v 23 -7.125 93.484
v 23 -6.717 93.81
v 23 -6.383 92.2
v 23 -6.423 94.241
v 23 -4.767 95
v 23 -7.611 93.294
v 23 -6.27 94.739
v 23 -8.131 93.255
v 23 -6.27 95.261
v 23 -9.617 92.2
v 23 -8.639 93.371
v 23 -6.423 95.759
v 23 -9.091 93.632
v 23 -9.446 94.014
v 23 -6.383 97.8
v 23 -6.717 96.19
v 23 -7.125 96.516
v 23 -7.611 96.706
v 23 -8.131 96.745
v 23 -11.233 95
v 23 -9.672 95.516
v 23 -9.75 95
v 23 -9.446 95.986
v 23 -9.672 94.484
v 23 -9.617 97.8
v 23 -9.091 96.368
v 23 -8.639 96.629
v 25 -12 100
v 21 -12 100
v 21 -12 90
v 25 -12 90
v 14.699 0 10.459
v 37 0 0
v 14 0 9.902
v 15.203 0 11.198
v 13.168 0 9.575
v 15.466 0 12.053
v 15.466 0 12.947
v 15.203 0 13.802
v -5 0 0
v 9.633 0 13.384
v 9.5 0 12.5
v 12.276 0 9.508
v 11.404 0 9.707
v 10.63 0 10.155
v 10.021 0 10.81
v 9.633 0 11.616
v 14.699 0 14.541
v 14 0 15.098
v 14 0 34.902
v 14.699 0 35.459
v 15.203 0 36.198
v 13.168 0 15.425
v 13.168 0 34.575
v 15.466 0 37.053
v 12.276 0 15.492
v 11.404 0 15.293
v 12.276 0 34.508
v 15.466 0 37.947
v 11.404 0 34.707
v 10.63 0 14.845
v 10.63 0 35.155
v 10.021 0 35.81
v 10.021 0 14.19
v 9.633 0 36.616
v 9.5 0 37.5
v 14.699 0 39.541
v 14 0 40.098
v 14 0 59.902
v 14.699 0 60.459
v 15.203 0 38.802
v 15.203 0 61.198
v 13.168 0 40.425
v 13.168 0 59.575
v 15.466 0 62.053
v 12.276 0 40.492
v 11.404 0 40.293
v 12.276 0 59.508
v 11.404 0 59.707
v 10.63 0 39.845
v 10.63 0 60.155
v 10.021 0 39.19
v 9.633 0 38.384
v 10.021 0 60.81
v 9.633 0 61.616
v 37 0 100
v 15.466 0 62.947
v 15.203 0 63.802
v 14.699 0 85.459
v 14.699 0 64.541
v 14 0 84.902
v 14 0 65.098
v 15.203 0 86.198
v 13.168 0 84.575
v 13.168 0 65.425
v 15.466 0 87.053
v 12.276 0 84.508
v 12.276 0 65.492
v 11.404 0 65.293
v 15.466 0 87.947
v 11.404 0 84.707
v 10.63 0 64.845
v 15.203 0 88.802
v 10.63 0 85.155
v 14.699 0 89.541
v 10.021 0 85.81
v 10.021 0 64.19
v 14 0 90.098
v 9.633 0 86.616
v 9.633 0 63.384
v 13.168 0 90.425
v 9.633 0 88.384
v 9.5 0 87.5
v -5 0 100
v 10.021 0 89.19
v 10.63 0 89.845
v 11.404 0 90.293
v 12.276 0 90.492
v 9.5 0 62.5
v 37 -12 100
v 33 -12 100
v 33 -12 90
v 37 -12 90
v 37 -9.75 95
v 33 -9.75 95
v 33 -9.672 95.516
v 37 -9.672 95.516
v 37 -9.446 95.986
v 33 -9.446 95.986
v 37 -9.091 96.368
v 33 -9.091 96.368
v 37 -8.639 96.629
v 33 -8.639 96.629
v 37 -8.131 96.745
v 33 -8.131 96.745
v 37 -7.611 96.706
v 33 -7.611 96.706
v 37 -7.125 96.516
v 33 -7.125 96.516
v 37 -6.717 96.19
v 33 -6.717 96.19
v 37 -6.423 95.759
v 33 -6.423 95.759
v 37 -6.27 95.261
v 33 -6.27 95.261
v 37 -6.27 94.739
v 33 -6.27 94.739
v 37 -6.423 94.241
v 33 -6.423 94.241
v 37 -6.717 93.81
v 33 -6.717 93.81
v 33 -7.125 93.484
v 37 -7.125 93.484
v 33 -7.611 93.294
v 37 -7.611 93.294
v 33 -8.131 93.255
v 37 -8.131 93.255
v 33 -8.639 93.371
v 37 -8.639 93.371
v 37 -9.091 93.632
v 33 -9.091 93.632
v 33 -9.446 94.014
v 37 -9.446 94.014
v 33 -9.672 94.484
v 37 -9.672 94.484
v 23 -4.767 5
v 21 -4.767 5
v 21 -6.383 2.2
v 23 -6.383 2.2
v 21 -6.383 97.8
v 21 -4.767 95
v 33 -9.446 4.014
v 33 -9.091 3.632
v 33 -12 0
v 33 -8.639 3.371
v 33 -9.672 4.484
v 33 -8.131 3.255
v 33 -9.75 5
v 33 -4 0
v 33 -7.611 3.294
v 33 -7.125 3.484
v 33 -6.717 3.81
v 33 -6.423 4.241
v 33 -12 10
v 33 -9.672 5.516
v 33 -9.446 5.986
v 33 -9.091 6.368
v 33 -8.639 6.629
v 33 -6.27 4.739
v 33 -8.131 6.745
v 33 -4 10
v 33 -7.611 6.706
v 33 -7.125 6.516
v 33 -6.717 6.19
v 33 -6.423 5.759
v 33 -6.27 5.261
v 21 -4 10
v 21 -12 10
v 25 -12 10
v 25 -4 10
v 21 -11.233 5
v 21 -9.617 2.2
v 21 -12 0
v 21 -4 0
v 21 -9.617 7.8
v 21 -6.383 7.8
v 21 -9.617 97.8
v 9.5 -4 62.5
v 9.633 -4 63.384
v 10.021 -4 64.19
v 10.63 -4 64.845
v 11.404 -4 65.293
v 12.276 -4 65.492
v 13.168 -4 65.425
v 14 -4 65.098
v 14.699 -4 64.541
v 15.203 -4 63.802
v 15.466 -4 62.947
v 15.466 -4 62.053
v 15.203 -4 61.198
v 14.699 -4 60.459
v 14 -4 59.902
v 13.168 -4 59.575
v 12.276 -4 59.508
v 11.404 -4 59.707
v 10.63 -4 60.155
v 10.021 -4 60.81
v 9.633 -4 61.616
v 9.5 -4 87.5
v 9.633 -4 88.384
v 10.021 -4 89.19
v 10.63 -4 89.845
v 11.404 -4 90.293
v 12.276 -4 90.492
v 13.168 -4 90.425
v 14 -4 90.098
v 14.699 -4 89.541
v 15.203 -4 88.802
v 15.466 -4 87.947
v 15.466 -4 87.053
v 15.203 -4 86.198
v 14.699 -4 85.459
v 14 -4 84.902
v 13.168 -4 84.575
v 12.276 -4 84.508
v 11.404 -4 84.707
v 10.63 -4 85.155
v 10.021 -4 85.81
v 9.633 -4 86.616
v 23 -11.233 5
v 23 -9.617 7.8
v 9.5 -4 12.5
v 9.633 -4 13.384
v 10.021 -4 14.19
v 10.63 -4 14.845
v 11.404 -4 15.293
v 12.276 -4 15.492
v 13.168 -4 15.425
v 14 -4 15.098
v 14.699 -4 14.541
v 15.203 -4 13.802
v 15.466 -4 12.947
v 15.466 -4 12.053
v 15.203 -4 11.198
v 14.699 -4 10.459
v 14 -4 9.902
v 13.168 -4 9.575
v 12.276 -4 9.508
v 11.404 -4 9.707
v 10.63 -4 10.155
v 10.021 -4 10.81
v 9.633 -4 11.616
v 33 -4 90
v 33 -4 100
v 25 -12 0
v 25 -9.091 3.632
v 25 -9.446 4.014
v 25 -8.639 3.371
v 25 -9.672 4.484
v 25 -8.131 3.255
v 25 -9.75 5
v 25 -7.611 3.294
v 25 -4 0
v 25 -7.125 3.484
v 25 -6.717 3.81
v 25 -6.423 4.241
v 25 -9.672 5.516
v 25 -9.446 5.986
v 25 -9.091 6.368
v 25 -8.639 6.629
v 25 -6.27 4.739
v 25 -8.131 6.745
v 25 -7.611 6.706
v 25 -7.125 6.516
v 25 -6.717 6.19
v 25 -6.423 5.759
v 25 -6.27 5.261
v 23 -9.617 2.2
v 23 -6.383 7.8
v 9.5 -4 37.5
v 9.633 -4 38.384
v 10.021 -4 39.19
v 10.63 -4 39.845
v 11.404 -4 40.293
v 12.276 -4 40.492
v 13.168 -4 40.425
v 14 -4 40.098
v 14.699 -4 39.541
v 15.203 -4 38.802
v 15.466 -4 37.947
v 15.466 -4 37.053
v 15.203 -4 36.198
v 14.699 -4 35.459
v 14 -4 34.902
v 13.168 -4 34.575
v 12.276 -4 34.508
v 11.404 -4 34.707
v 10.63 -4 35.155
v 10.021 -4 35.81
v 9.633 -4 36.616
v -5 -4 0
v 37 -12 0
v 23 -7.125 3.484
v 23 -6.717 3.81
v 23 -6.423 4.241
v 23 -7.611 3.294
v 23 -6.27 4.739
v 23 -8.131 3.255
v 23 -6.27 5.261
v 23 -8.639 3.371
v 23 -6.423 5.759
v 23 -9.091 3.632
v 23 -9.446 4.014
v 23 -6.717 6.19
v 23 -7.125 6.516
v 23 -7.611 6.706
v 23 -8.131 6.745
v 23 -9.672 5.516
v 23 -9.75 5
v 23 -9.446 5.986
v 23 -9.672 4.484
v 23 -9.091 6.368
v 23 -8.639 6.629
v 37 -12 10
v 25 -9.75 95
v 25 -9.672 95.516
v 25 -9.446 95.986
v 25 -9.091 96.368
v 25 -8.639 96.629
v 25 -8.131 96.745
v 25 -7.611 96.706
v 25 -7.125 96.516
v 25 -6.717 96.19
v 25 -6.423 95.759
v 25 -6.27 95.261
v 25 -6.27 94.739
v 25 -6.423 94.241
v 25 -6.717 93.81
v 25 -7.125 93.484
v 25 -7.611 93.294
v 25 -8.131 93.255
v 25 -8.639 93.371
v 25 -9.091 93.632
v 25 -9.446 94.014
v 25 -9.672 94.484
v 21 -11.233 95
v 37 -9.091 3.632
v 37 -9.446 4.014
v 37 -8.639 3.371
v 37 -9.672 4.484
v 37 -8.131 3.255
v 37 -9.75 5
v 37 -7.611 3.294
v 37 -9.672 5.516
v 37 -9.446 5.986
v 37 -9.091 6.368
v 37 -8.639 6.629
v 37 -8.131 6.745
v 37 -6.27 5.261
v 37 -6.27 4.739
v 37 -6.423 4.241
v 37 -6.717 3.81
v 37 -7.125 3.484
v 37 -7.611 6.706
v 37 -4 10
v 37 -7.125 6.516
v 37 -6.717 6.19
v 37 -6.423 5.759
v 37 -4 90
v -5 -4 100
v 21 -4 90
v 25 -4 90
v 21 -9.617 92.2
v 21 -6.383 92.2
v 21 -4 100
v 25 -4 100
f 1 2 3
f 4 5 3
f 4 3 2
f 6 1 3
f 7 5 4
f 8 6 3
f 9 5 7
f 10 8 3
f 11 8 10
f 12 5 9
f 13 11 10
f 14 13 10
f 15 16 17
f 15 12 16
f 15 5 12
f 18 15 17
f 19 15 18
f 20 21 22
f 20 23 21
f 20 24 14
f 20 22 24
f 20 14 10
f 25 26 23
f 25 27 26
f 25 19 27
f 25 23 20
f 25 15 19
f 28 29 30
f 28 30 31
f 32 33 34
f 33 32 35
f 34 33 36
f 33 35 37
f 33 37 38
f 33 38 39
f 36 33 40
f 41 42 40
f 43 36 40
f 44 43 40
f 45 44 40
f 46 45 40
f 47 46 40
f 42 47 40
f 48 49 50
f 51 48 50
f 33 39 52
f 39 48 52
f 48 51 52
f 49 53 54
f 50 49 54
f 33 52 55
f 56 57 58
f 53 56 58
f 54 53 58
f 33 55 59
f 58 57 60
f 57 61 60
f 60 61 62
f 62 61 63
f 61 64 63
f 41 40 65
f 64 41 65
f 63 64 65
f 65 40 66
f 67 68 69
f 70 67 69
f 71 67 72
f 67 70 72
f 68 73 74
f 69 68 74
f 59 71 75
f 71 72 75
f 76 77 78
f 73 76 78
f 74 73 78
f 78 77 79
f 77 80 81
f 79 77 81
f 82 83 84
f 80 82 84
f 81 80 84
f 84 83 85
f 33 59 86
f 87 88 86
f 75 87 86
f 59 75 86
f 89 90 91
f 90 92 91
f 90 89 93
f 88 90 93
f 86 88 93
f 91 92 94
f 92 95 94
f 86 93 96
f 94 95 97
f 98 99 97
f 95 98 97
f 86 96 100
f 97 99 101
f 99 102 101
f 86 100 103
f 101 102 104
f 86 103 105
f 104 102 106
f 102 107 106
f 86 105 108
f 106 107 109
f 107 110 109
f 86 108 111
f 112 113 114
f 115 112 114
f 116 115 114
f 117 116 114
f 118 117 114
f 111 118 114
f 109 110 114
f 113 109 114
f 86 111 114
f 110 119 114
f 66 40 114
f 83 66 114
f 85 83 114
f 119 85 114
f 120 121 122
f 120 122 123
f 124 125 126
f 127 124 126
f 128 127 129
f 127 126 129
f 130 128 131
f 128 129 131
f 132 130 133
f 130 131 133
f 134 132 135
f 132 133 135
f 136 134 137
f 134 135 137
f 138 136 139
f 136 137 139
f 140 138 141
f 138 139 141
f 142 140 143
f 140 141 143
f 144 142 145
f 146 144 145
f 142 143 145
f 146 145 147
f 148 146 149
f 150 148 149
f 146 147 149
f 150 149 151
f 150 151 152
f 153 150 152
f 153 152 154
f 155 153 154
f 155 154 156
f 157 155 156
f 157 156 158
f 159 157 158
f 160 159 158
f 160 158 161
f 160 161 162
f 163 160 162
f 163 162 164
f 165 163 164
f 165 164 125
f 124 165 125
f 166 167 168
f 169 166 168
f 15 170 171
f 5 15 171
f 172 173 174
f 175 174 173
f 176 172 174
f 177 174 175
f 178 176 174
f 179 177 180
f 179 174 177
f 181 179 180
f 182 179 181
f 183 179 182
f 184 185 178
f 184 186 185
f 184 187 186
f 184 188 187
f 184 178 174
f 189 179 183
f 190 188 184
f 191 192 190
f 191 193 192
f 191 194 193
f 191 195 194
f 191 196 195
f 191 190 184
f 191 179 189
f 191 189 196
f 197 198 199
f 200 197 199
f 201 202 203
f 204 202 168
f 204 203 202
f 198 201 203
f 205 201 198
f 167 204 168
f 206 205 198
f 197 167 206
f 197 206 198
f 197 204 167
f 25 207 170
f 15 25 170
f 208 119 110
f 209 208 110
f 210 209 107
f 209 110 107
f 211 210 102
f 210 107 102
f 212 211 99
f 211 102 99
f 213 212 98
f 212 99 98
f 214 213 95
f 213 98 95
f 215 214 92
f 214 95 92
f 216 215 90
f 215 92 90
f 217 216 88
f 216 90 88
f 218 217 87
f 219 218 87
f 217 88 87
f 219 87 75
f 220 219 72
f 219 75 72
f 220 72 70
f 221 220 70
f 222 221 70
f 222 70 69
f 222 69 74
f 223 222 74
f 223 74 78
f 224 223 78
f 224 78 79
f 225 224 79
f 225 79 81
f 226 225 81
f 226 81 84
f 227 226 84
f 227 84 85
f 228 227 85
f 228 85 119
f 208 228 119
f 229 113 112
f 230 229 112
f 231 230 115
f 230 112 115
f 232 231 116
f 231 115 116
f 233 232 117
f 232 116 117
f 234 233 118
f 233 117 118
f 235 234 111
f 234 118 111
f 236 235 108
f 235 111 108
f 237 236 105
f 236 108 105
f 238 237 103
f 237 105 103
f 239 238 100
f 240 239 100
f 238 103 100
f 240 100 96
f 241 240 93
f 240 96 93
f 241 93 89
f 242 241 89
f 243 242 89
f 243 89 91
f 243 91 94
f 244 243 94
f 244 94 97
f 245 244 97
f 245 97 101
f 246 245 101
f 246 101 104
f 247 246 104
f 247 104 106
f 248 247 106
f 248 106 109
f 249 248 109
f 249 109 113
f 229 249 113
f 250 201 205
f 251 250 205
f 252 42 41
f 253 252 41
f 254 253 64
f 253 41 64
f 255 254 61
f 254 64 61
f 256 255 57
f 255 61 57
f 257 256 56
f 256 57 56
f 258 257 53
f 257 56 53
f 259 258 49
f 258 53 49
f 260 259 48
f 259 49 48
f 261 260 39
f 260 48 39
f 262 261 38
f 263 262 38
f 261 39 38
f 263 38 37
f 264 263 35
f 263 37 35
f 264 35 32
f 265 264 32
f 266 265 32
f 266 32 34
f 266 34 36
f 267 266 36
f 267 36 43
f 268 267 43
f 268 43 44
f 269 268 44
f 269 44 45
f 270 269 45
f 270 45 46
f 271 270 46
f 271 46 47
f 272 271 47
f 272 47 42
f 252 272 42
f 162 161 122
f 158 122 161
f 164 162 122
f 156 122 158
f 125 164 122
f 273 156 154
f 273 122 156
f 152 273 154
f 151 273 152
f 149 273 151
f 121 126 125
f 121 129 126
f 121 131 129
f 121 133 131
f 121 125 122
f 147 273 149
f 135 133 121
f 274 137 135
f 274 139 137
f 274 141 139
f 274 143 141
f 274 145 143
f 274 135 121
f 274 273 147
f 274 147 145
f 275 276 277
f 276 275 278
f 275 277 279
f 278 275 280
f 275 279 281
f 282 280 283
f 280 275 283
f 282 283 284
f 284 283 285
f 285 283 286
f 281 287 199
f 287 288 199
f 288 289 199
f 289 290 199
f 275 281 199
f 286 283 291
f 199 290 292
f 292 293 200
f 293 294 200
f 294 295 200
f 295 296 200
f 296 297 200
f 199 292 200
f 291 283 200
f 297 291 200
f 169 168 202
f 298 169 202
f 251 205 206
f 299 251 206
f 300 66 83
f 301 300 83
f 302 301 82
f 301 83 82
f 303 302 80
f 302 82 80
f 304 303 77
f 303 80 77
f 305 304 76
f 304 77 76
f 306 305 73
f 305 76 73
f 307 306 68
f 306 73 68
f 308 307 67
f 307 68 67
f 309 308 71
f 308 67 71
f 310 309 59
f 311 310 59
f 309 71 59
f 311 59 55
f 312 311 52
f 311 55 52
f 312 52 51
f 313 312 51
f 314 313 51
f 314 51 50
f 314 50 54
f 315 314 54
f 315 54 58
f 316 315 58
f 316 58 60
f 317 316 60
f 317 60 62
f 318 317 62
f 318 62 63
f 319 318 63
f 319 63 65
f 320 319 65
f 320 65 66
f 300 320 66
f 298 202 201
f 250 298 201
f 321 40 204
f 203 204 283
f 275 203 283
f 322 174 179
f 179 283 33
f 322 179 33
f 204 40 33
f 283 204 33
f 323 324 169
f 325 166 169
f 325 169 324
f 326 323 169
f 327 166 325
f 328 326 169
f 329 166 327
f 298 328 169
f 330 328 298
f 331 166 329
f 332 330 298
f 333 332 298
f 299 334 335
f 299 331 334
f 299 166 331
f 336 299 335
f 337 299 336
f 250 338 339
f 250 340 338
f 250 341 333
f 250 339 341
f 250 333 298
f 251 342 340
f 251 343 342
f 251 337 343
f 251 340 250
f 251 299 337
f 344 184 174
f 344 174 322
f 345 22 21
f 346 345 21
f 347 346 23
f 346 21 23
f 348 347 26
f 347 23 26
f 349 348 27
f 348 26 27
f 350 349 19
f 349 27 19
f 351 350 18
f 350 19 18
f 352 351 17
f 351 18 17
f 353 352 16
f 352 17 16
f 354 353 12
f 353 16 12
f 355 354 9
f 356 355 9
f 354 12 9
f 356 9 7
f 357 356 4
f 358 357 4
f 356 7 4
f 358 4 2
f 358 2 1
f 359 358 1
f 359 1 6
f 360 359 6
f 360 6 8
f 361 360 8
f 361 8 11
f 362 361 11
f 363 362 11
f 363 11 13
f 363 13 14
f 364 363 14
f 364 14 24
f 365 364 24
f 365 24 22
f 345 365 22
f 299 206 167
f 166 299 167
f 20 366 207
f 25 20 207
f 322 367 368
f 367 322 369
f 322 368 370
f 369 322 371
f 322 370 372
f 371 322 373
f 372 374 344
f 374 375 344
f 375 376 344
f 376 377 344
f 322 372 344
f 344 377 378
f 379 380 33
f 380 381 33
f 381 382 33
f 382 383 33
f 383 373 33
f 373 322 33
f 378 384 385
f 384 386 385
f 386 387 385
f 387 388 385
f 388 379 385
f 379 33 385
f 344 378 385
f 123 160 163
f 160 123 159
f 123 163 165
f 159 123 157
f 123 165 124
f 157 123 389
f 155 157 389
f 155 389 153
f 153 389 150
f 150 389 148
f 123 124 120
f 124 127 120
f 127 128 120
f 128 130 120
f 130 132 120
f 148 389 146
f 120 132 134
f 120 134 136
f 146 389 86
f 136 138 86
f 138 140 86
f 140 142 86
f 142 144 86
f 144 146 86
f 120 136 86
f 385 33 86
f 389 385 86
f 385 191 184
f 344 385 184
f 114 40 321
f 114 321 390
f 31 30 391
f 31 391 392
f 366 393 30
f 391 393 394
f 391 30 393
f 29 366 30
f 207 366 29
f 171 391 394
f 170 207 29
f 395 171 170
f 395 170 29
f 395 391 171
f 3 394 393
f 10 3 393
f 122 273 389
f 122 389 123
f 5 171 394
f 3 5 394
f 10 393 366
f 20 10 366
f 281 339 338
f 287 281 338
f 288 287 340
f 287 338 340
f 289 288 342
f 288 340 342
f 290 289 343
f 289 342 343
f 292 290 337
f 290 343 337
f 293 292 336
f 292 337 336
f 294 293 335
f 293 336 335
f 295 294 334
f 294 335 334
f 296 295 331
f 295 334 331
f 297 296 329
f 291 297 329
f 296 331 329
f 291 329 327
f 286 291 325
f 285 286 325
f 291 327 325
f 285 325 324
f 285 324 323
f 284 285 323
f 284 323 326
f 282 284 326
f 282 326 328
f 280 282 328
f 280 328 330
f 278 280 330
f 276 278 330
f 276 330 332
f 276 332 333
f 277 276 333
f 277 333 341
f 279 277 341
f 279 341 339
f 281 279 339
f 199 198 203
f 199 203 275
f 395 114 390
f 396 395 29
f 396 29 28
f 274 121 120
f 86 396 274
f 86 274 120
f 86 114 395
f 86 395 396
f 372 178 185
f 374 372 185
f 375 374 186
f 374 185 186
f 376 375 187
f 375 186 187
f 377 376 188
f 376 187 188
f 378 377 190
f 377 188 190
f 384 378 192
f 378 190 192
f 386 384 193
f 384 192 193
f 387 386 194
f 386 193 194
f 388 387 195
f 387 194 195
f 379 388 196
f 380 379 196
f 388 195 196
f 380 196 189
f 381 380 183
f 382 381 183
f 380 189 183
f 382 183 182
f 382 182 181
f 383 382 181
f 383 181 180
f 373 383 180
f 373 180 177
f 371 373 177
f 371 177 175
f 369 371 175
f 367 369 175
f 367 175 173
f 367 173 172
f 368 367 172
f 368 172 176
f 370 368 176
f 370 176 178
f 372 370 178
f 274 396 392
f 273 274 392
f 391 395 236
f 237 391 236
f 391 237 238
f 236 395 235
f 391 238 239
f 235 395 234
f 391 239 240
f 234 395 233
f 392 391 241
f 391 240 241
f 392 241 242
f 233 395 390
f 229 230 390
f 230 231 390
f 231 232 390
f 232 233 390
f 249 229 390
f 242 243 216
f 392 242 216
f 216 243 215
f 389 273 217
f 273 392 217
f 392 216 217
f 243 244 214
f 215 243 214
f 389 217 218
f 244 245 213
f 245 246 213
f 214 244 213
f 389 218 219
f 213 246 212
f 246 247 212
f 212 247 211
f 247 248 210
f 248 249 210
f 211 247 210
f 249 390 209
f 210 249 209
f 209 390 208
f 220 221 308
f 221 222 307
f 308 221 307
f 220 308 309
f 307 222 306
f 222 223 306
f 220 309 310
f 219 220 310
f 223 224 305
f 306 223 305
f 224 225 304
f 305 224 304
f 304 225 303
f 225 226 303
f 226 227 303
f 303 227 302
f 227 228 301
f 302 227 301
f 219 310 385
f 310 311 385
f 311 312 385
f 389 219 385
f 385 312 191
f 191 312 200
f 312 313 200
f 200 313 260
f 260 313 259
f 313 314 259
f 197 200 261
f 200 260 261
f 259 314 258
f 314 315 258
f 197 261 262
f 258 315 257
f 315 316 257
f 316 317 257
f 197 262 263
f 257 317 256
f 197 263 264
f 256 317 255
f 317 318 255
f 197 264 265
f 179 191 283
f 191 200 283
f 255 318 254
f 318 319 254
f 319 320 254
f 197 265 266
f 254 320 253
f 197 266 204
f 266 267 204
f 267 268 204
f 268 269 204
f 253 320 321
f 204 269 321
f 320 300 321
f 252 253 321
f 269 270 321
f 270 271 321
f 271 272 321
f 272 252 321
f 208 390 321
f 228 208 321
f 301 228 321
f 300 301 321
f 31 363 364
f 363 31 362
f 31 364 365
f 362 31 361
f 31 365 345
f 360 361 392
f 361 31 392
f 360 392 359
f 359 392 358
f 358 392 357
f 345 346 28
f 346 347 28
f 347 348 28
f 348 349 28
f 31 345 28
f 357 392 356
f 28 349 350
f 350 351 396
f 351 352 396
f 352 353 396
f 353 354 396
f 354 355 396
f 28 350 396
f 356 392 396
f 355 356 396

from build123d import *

# Parameters (mm, degrees)
F0_W      = 25
F0_H      = 100
F1_DEPTH  = 4
F2_W      = 4
F2_H      = 10
F3_DEPTH  = 8
F5_DEPTH  = 5
F4_R      = 3
F6_DEPTH  = 25
F8_DEPTH  = 12
F9_W      = 4
F9_H      = 100
F10_DEPTH = 8
F11_W     = 8
F11_H     = 80
F12_DEPTH = 25
F13_R     = 1.75
F14_DEPTH = 2
F15_DEPTH = 25


with BuildPart() as f1:
    # F0 (on Front) → F1 (new body)
    with BuildSketch(Plane.XZ):
        with Locations((12.5, 50)):
            Rectangle(F0_W, F0_H)
    extrude(amount=F1_DEPTH)

    # F2 (on face) → F3 (join)
    with BuildSketch(Plane.XZ.offset(4)):
        with Locations((23, 95)):
            Rectangle(F2_W, F2_H)
        with Locations((23, 5)):
            Rectangle(F2_W, F2_H)
    extrude(amount=F3_DEPTH)

    # F5 (add): a face of the model
    f5_faces = [f1.faces().sort_by_distance(p)[0] for p in [
        (0, -2, 50),
    ]]
    extrude(f5_faces, amount=F5_DEPTH)

    # F4 (on face) → F6 (cut)
    with BuildSketch(Plane(origin=(0, 0, 0), x_dir=(-1, 0, 0), z_dir=(0, 1, 0))):
        with Locations((-12.5, 12.5)):
            Circle(F4_R)
        with Locations((-12.5, 37.5)):
            Circle(F4_R)
        with Locations((-12.5, 62.5)):
            Circle(F4_R)
        with Locations((-12.5, 87.5)):
            Circle(F4_R)
    extrude(amount=-F6_DEPTH, mode=Mode.SUBTRACT)

    # F7 (on face) → F8 (join)
    with BuildSketch(Plane.YZ.offset(25)):
        Polygon((-4, 0), (0, 0), (0, 100), (-4, 100), (-4, 90), (-4, 10), align=None)
    extrude(amount=F8_DEPTH)

    # F9 (on face) → F10 (join, through all)
    with BuildSketch(Plane.XZ.offset(4)):
        with Locations((35, 50)):
            Rectangle(F9_W, F9_H)
    extrude(amount=F10_DEPTH)

    # F11 (on face) → F12 (cut)
    with BuildSketch(Plane(origin=(33, 0, 0), x_dir=(0, -1, 0), z_dir=(-1, 0, 0))):
        with Locations((8, 50)):
            Rectangle(F11_W, F11_H)
    extrude(amount=-F12_DEPTH, mode=Mode.SUBTRACT)

    # F13 (on face) → F14 (cut)
    with BuildSketch(Plane(origin=(21, 0, 0), x_dir=(0, -1, 0), z_dir=(-1, 0, 0))):
        Polygon((11.2331615075, 5), (9.6165807537, 7.8), (6.3834192463, 7.8), (4.7668384925, 5), (6.3834192463, 2.2), (9.6165807537, 2.2), align=None)
        with Locations((8, 5)):
            Circle(F13_R, mode=Mode.SUBTRACT)
        Polygon((9.6165807537, 92.2), (11.2331615075, 95), (9.6165807537, 97.8), (6.3834192463, 97.8), (4.7668384925, 95), (6.3834192463, 92.2), align=None)
        with Locations((8, 95)):
            Circle(F13_R, mode=Mode.SUBTRACT)
    extrude(amount=-F14_DEPTH, mode=Mode.SUBTRACT)

    # F13 (on face) → F15 (cut)
    with BuildSketch(Plane(origin=(21, 0, 0), x_dir=(0, -1, 0), z_dir=(-1, 0, 0))):
        with Locations((8, 5)):
            Circle(F13_R)
        with Locations((8, 95)):
            Circle(F13_R)
    extrude(amount=-F15_DEPTH, mode=Mode.SUBTRACT)


solid = f1.part
